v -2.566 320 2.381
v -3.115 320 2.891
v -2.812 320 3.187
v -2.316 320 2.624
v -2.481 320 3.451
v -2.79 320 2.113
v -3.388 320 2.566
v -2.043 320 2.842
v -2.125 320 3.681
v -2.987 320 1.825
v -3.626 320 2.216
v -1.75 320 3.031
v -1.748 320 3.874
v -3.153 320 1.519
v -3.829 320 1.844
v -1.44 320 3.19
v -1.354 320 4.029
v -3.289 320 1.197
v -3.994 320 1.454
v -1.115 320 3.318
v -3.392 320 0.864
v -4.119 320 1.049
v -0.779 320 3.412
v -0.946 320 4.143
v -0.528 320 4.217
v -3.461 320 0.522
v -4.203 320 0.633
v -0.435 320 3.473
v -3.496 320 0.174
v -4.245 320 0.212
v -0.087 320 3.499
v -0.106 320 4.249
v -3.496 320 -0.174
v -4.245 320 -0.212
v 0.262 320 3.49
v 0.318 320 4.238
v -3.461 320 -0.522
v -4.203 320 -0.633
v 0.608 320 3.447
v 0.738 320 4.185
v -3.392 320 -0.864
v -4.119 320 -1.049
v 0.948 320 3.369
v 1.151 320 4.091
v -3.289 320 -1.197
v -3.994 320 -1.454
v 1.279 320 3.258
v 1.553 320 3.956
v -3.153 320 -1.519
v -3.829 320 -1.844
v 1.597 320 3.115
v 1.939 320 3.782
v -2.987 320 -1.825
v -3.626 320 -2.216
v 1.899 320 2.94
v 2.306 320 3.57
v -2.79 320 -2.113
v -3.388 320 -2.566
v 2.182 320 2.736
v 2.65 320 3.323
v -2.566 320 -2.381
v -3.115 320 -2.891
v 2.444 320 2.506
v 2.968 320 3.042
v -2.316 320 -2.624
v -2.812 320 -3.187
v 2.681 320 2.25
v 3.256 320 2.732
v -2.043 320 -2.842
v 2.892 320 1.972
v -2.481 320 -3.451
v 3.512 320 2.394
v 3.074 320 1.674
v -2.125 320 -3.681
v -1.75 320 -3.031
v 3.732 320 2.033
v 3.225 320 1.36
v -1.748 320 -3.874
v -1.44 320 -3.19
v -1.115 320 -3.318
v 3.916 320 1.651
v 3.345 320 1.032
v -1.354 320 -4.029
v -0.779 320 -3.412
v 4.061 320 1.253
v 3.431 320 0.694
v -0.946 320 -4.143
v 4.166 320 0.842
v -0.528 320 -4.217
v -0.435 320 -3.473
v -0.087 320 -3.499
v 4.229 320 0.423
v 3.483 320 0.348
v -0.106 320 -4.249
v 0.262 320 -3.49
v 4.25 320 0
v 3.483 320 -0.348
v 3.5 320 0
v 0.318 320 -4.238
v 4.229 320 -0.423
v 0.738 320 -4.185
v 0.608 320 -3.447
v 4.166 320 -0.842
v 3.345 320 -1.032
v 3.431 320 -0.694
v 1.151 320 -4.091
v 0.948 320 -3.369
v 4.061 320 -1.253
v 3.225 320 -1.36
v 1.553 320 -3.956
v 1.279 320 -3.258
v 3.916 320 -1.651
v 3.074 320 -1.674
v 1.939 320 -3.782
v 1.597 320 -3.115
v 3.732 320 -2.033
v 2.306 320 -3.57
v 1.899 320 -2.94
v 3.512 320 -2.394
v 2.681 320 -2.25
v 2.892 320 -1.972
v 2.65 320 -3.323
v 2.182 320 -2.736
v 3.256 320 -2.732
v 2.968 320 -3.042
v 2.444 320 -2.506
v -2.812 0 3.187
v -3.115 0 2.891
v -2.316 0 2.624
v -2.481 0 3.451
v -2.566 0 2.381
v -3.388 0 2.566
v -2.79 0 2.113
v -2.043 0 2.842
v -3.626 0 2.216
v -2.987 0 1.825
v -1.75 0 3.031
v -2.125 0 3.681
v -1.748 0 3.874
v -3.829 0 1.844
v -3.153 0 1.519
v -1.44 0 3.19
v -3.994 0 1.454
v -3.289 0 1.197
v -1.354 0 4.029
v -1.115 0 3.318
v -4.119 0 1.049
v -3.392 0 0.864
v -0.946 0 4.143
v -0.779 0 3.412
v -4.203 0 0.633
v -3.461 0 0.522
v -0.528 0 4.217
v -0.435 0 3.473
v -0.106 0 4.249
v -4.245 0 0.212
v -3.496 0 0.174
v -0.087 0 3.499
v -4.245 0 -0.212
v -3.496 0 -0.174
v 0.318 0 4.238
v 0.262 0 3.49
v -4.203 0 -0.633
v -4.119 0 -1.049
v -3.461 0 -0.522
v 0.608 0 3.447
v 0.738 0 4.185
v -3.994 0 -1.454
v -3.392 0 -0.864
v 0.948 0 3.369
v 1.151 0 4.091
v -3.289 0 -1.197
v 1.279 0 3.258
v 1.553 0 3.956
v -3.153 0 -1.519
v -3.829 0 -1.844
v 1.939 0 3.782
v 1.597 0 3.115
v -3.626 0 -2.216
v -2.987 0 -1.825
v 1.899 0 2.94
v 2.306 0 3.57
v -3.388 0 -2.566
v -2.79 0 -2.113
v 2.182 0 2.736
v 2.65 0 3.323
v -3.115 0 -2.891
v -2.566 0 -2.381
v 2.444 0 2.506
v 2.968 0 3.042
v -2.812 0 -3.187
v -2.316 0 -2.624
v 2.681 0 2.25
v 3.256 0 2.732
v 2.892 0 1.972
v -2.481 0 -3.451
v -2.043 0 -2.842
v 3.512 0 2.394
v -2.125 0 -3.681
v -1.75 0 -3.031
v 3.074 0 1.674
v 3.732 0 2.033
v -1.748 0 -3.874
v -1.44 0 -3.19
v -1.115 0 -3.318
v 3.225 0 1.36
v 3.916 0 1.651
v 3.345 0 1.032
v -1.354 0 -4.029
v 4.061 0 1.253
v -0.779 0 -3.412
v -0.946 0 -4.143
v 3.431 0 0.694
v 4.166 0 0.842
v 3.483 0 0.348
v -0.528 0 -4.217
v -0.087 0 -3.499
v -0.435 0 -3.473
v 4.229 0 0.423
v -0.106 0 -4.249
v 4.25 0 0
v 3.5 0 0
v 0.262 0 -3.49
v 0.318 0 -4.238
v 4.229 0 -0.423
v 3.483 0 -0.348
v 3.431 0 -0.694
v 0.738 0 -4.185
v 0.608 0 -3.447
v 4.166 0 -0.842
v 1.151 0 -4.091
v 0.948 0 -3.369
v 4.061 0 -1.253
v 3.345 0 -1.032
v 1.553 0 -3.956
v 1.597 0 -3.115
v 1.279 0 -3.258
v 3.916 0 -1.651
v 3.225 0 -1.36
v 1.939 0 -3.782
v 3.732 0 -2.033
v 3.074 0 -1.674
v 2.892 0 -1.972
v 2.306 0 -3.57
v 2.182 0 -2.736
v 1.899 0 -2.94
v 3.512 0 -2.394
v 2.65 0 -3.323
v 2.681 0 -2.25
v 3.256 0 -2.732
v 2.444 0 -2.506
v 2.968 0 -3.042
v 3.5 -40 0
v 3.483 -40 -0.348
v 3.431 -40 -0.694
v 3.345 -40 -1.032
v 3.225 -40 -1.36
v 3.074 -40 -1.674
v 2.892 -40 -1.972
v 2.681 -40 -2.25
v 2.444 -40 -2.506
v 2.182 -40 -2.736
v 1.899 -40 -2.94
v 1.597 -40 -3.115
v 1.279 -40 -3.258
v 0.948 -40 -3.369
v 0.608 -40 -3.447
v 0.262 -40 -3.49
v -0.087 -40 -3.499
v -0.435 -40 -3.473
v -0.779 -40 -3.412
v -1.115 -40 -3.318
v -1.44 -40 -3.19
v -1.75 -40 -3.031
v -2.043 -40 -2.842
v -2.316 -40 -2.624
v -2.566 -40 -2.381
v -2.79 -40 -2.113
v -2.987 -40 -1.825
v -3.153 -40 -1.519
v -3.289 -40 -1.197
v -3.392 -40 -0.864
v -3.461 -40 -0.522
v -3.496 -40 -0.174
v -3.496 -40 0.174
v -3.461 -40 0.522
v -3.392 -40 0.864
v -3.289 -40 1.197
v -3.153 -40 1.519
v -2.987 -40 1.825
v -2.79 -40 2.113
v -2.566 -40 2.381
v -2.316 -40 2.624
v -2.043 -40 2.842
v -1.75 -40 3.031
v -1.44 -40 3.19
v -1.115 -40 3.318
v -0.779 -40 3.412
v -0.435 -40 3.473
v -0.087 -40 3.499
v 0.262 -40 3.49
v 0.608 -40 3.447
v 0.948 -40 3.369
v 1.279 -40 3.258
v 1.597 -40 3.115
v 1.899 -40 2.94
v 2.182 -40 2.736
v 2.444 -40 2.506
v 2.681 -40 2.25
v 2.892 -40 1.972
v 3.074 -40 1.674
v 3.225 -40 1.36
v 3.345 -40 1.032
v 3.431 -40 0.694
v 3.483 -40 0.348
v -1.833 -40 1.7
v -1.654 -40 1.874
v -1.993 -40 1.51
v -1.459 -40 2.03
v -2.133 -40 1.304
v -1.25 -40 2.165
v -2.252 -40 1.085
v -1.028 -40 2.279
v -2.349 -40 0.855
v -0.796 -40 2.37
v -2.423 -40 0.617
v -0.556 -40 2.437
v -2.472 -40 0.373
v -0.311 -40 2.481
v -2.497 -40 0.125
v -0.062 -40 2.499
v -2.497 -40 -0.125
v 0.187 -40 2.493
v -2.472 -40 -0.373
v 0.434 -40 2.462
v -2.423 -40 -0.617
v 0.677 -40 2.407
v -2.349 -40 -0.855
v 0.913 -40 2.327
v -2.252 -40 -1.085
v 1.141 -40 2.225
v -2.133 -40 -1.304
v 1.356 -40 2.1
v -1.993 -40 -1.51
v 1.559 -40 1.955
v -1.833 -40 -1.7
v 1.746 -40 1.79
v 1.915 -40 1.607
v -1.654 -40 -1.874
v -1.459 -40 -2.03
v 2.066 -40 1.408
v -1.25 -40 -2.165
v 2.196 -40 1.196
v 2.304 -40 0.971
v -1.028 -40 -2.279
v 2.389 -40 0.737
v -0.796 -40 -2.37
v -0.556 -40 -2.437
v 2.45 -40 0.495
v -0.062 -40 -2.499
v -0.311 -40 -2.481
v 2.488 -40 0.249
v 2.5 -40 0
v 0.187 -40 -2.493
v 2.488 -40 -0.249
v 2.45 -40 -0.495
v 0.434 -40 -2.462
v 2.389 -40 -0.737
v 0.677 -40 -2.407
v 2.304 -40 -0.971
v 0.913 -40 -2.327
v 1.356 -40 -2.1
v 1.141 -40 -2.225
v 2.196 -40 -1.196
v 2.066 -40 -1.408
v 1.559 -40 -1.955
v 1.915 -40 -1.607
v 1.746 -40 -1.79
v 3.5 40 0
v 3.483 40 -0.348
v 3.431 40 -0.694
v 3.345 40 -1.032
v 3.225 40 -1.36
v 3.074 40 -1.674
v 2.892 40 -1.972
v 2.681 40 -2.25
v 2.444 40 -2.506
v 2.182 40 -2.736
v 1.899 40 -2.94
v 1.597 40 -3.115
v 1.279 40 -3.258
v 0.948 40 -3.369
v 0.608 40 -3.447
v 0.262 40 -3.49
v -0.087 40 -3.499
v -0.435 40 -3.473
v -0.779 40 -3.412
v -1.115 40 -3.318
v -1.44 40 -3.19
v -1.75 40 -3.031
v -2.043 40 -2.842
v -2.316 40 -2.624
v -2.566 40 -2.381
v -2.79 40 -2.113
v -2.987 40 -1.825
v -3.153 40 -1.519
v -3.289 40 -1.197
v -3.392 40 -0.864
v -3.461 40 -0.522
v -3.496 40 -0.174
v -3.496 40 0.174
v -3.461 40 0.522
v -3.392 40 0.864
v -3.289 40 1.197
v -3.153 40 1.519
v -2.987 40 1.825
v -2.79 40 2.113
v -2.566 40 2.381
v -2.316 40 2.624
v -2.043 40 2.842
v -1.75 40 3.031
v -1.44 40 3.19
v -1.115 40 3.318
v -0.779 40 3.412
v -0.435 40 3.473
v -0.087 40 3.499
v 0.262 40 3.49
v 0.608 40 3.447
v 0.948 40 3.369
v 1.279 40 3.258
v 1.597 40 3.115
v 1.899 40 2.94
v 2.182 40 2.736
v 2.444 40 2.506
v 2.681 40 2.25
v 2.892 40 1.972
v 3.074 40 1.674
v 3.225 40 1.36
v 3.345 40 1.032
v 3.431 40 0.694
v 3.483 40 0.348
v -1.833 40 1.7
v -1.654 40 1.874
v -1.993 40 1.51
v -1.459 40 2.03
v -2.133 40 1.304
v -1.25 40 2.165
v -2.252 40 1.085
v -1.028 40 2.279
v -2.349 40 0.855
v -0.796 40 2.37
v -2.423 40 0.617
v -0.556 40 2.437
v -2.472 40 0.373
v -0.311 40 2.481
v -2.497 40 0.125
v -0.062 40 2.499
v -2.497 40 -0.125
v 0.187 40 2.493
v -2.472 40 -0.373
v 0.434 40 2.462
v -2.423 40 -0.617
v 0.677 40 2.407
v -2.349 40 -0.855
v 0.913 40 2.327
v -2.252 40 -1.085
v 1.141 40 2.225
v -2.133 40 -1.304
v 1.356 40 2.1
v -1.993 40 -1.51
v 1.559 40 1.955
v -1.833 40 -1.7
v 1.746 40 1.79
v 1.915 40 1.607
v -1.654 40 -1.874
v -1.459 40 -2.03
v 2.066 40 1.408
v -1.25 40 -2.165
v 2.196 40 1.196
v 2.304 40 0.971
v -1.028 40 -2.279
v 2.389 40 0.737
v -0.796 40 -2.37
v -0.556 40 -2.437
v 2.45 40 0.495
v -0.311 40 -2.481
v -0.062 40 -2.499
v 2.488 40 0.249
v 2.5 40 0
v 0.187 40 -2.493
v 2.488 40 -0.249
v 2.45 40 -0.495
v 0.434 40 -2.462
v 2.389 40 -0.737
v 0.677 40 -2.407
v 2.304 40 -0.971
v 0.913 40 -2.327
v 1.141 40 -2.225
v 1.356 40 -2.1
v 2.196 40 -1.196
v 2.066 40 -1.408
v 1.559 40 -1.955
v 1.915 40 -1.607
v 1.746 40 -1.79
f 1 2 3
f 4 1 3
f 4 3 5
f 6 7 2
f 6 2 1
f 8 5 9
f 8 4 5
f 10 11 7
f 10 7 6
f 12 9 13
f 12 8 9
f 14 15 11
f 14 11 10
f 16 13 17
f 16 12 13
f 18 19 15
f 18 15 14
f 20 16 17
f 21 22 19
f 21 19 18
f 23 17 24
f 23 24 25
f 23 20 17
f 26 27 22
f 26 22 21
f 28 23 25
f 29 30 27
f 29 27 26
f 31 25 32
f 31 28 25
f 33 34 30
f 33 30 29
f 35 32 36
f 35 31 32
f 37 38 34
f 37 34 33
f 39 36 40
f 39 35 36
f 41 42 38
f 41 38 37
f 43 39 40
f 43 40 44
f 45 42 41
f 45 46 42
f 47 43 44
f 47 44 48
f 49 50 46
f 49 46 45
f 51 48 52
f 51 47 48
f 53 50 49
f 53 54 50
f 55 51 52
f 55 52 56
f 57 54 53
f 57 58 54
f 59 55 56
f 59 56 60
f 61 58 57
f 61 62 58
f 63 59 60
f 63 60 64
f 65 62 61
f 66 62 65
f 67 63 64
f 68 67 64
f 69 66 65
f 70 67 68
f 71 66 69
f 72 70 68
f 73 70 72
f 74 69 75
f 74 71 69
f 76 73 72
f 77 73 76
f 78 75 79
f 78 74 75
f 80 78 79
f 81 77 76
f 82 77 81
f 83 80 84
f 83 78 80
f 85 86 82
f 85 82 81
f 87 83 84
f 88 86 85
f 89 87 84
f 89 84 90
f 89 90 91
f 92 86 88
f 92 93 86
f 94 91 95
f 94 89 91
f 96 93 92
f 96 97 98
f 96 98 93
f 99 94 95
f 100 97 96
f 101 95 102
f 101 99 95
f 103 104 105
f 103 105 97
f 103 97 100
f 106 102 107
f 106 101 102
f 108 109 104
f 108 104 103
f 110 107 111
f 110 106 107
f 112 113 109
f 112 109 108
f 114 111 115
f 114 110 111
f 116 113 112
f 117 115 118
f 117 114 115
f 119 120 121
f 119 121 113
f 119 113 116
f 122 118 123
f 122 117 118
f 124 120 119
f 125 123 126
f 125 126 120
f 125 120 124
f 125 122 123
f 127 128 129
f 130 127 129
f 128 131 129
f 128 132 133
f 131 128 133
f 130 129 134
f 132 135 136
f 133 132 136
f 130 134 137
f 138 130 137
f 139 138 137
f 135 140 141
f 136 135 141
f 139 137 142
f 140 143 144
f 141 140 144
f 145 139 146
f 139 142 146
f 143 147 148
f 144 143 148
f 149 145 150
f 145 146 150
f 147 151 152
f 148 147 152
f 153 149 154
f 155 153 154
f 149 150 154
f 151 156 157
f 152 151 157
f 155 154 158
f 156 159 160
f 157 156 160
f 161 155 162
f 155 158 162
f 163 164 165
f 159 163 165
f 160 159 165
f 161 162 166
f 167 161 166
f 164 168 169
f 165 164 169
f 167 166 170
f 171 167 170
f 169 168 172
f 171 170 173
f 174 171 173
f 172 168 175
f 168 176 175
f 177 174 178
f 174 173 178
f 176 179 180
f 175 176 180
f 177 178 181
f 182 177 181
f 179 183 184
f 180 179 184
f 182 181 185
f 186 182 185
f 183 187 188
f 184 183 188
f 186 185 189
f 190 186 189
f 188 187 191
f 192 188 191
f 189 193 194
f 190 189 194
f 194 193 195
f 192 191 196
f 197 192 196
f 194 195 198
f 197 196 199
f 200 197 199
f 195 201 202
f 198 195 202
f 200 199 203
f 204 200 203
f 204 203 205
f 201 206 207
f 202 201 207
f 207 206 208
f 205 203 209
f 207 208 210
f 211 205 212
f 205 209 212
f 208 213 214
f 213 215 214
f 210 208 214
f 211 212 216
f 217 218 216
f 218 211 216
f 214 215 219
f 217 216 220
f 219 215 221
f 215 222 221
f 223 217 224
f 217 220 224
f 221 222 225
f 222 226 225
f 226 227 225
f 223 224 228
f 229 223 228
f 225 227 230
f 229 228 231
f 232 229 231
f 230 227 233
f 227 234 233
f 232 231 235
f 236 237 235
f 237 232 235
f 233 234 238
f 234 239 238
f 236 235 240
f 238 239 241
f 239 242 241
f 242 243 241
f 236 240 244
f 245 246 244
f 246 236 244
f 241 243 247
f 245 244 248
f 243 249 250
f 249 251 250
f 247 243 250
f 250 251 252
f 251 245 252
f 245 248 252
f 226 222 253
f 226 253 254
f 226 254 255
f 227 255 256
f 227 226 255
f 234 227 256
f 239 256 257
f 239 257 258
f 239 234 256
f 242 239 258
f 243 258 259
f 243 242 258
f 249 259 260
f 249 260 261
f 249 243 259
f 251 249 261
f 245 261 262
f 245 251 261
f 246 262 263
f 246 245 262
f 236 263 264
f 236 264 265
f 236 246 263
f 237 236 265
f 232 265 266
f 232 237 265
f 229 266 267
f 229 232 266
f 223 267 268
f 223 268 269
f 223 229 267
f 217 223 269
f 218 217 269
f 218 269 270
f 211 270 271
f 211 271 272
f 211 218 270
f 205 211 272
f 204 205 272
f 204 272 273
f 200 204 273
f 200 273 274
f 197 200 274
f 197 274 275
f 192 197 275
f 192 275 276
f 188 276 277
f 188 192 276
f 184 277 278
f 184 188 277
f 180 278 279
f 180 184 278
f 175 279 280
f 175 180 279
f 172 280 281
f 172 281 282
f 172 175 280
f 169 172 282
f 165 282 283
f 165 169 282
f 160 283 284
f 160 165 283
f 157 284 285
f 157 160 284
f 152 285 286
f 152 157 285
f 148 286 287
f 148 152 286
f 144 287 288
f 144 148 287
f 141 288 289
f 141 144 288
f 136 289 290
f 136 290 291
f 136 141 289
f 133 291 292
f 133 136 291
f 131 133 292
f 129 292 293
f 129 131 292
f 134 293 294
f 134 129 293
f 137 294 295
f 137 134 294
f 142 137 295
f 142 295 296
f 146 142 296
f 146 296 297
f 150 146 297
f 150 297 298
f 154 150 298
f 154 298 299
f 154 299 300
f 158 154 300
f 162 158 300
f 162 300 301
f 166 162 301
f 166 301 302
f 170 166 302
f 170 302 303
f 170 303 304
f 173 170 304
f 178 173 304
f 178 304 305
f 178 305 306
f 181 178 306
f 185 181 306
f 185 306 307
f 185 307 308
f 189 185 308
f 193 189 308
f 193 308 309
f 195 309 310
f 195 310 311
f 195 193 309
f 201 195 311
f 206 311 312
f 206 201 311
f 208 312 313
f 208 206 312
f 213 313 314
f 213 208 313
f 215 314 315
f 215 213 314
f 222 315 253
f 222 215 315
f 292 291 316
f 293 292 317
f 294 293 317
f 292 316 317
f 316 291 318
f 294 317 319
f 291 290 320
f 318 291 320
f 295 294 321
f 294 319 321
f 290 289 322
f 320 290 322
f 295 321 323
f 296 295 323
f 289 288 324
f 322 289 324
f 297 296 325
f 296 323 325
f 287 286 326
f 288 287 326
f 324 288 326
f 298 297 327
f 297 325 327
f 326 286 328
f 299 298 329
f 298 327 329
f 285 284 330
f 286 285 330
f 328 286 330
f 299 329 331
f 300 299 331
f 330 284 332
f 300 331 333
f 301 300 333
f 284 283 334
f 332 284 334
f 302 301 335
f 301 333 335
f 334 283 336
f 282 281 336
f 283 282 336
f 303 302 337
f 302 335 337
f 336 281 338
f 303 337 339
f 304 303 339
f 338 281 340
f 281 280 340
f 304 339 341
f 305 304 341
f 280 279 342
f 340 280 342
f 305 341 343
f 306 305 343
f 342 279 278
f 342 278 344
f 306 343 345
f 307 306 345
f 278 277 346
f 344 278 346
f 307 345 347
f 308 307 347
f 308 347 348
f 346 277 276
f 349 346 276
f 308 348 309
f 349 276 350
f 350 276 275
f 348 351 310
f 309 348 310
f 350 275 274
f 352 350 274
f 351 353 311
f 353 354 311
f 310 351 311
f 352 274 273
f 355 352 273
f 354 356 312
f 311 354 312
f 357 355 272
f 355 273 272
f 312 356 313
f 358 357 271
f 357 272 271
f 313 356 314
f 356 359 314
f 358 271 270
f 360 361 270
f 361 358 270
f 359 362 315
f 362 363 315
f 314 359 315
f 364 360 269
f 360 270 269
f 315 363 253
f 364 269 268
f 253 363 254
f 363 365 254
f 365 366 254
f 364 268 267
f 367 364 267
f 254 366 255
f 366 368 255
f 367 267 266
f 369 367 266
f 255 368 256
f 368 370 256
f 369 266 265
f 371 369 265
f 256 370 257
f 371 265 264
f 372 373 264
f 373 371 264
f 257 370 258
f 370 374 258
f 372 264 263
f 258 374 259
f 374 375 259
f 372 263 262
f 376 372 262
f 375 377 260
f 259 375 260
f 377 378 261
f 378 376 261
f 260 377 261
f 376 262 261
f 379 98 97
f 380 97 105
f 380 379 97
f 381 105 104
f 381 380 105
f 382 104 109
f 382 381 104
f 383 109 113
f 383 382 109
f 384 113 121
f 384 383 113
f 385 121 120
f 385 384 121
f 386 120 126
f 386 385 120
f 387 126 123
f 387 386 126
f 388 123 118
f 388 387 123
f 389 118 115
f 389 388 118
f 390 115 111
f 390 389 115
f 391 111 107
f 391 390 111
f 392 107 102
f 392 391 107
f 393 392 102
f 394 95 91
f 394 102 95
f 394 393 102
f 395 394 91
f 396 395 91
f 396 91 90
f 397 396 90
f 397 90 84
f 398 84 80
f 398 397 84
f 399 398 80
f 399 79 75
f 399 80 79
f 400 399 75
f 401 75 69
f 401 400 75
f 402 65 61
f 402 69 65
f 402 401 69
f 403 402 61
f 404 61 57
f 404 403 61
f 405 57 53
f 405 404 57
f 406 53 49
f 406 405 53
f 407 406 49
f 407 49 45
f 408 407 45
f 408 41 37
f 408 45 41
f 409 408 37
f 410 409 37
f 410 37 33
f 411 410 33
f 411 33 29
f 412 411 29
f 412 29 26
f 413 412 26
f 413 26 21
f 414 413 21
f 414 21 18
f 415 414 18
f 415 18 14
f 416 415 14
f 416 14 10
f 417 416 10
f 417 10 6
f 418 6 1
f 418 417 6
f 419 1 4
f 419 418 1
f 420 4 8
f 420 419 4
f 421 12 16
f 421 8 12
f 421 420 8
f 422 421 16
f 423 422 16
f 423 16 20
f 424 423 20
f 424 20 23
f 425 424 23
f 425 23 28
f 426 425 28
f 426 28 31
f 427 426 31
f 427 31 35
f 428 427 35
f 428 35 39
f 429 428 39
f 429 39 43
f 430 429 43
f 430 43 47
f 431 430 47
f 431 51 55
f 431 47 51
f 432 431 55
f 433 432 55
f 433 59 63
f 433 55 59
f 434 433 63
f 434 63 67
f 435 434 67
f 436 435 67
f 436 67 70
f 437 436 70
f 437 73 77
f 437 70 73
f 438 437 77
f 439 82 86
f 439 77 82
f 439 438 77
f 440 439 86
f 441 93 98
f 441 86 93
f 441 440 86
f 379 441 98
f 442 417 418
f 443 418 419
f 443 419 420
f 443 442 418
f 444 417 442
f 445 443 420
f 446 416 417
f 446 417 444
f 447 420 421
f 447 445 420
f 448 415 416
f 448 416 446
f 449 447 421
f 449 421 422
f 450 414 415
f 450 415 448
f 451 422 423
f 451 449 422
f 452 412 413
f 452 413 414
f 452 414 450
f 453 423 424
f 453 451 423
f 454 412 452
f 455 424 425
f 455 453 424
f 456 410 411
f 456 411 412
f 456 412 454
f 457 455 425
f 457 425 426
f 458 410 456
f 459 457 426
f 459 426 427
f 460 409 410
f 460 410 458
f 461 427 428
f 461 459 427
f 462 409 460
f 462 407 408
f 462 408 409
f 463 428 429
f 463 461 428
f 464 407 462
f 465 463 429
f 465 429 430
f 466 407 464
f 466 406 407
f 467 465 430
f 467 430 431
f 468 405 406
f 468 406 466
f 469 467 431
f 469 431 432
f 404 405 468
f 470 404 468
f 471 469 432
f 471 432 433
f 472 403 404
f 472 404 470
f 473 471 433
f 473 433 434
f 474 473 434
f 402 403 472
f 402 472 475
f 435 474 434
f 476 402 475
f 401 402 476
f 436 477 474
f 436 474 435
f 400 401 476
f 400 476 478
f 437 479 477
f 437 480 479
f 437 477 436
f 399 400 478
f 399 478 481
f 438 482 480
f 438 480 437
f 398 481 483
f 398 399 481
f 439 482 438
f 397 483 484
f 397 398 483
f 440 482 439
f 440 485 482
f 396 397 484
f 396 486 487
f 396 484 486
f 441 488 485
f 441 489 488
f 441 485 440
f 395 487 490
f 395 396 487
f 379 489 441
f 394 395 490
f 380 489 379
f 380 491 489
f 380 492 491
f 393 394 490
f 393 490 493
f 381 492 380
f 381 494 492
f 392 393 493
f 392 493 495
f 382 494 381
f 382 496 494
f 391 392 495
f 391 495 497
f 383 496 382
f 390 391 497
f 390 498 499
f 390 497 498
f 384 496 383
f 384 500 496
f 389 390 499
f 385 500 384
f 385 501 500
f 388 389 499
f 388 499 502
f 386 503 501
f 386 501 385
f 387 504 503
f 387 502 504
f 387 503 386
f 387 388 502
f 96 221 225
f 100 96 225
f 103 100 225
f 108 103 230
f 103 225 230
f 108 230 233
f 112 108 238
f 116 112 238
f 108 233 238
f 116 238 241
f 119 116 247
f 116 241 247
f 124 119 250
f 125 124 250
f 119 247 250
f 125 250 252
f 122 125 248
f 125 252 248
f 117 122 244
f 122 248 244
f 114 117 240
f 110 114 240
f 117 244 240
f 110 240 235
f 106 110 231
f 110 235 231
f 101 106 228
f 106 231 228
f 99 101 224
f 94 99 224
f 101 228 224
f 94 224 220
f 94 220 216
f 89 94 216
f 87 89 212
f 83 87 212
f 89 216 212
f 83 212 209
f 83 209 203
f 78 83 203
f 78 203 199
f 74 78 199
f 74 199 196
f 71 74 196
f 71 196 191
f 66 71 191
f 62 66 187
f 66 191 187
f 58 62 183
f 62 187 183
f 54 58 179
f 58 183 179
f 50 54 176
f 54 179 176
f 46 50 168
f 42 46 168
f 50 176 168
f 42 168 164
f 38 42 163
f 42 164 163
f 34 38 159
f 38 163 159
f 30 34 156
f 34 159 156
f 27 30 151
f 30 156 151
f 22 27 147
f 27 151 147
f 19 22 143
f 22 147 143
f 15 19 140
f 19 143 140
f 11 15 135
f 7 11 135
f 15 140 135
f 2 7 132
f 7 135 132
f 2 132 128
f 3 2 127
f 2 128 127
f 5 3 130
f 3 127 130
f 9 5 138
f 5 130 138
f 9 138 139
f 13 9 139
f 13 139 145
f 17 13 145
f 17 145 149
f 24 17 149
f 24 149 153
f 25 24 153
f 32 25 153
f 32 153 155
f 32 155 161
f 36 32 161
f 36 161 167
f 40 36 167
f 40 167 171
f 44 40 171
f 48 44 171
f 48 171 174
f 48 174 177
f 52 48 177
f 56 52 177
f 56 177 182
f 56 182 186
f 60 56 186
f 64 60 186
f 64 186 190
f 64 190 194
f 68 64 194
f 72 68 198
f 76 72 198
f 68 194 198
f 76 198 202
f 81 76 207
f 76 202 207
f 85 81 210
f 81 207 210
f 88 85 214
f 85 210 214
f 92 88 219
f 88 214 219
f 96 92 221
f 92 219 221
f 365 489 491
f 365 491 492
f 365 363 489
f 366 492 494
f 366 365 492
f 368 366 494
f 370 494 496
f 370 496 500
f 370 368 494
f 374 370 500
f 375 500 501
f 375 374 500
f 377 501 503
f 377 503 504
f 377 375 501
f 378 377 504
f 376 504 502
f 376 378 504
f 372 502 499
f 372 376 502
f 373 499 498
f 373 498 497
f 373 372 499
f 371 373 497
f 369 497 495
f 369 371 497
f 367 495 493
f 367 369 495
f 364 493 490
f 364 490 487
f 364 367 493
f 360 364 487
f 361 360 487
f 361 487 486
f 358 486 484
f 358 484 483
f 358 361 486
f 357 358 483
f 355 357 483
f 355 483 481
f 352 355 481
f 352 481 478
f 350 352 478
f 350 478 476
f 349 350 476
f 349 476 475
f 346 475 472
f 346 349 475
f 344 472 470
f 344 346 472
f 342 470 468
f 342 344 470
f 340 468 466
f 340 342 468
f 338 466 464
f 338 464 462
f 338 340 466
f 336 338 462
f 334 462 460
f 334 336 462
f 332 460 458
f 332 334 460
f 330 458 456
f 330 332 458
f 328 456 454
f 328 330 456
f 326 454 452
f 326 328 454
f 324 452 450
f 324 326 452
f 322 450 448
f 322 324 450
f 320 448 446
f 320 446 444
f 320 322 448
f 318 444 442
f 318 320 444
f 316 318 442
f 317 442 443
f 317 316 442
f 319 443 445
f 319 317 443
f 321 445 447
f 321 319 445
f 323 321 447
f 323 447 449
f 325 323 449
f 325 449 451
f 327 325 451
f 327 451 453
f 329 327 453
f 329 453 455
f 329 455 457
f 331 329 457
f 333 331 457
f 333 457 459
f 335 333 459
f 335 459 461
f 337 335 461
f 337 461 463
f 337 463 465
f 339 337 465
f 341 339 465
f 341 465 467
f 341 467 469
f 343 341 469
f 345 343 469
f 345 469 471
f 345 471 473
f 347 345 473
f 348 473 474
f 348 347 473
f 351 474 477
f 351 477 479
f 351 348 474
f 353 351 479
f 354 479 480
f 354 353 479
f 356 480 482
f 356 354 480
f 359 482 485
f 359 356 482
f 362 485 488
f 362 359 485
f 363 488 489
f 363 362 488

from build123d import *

# Parameters (mm, degrees)
SKETCH_1_R          = 4.25
EXTRUDE_1_DEPTH     = 320
SKETCH_2_R          = 3.5
CUT_EXTRUDE_1_DEPTH = 494
SKETCH_3_R          = 3.5
SKETCH_3_R_2        = 2.5
EXTRUDE_2_DEPTH     = 40


with BuildPart() as part:
    # 草图1 → 凸台-拉伸1 (new body)
    with BuildSketch(Plane(origin=(0, 0, 0), x_dir=(1, 0, 0), z_dir=(0, 1, 0))):
        Circle(SKETCH_1_R)
    extrude(amount=EXTRUDE_1_DEPTH)

    # 草图2 → 切除-拉伸1 (cut)
    with BuildSketch(Plane(origin=(0, 0, 0), x_dir=(1, 0, 0), z_dir=(0, 1, 0))):
        Circle(SKETCH_2_R)
    extrude(amount=CUT_EXTRUDE_1_DEPTH, mode=Mode.SUBTRACT)

    # 草图3 → 凸台-拉伸2 (add, symmetric)
    with BuildSketch(Plane(origin=(0, 0, 0), x_dir=(1, 0, 0), z_dir=(0, 1, 0))):
        Circle(SKETCH_3_R)
        Circle(SKETCH_3_R_2, mode=Mode.SUBTRACT)
    extrude(amount=EXTRUDE_2_DEPTH, both=True)


solid = part.part
